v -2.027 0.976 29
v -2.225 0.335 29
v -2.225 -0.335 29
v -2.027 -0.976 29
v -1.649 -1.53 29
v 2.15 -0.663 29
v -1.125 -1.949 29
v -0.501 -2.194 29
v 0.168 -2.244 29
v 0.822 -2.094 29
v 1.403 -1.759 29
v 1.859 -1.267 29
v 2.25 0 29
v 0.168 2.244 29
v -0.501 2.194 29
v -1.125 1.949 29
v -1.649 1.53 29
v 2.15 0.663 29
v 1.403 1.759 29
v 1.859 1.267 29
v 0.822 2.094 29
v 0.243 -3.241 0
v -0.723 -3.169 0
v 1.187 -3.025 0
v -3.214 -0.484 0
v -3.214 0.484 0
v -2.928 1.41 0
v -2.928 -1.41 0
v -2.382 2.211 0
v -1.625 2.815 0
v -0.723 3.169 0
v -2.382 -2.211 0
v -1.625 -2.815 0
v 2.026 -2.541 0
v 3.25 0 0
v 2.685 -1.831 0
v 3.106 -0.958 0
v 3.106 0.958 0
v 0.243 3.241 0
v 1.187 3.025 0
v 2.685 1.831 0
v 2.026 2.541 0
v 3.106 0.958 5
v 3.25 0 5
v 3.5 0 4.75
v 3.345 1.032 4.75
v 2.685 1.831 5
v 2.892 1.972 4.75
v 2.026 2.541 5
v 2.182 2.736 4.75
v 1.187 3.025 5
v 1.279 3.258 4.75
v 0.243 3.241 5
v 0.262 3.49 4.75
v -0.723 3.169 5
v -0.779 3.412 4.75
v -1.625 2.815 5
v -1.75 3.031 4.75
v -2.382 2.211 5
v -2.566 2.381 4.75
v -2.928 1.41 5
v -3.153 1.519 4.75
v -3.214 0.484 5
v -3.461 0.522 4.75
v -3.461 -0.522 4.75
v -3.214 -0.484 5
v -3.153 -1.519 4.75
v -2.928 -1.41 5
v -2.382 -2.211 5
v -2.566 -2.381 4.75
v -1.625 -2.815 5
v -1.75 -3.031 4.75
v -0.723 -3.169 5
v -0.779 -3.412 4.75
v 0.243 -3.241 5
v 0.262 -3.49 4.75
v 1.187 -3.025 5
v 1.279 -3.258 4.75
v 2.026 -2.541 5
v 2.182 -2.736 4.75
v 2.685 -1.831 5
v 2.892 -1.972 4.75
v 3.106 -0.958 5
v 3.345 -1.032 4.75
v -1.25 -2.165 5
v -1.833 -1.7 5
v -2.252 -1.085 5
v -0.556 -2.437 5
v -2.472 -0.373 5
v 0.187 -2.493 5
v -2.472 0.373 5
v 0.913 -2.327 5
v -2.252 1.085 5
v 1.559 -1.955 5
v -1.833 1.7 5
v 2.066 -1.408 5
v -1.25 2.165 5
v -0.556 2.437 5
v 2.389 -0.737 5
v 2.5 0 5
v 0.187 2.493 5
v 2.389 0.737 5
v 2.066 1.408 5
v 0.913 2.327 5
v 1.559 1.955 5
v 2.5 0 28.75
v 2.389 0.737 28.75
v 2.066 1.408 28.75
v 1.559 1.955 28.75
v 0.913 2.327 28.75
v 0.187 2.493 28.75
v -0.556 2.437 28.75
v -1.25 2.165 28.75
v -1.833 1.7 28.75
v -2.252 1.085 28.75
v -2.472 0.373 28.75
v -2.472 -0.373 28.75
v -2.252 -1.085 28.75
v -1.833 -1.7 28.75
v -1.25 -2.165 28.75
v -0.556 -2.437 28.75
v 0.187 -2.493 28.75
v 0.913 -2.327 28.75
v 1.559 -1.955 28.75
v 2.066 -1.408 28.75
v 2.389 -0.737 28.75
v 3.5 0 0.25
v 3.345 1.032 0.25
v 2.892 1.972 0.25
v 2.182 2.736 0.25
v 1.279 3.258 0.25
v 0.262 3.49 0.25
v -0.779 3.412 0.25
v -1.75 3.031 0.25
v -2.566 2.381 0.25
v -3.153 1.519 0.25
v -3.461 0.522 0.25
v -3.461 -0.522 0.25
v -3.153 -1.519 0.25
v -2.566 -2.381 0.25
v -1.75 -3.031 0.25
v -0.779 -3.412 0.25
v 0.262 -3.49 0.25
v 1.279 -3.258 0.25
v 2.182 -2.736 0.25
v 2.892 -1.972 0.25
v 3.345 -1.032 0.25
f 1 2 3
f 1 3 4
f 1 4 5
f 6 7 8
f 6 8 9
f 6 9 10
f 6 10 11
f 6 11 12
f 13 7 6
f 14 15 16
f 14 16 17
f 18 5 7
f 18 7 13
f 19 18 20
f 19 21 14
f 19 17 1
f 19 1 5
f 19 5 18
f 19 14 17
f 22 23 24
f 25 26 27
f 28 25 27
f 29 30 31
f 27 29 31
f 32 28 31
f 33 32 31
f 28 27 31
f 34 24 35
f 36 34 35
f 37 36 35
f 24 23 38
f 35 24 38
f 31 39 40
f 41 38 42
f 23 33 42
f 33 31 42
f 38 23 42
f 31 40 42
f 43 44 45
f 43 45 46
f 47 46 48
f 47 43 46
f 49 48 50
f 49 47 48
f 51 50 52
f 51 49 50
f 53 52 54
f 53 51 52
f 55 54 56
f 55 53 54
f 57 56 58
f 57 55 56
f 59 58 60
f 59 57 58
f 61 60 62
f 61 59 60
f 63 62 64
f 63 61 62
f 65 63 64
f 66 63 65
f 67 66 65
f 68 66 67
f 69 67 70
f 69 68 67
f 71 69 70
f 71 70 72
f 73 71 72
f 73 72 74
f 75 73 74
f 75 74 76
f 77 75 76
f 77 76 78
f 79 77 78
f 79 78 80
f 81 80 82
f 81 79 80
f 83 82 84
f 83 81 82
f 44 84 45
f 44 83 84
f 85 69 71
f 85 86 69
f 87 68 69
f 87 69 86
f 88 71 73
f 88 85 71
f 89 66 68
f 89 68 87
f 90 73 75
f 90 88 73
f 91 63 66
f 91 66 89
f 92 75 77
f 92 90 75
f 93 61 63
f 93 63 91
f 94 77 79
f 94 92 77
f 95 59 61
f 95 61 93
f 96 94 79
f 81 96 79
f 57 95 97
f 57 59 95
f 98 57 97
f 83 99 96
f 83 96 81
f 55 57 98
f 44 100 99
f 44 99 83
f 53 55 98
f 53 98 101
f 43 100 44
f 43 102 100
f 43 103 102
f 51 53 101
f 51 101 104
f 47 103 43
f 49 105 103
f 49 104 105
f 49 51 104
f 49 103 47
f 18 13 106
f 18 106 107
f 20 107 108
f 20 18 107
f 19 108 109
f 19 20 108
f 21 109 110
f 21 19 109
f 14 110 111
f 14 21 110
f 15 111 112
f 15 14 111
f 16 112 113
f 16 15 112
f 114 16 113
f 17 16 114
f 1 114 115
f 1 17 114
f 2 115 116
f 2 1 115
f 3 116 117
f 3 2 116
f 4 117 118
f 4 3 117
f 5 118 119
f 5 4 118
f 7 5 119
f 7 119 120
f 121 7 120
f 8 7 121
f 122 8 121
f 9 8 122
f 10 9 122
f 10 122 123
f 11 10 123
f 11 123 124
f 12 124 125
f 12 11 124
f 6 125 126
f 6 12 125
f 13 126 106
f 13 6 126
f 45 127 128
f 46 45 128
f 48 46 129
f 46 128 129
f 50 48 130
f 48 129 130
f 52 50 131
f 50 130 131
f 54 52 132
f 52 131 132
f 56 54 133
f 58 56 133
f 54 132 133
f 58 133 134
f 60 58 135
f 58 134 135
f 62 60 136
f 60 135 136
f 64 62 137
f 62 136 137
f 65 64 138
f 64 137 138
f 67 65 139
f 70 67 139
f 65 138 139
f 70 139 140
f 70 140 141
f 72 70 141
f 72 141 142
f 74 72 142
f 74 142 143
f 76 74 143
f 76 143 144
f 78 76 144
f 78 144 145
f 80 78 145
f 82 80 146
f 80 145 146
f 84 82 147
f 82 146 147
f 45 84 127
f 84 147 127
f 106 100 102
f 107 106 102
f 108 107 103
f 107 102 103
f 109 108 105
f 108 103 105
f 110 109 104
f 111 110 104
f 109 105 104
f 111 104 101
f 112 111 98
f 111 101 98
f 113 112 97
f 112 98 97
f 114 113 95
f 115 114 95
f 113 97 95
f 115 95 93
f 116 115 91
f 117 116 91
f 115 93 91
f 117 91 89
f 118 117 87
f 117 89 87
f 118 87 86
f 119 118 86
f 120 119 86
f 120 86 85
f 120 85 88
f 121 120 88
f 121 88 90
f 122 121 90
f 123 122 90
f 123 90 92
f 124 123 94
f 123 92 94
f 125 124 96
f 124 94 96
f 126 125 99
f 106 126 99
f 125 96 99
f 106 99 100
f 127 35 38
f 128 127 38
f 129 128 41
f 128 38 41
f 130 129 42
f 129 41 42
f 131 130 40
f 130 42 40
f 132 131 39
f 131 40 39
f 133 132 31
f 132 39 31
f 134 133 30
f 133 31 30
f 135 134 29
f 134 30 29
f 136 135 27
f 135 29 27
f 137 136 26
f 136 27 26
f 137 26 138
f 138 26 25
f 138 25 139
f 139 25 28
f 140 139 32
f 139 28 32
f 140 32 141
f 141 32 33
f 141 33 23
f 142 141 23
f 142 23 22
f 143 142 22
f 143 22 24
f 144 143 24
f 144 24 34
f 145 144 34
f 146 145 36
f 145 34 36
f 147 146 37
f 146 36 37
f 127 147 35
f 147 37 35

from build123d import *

# Parameters (mm, degrees)
SCHIZZO1_R                   = 3.5
ESTRUSIONE_ESTRUSIONE1_DEPTH = 5
SCHIZZO2_R                   = 2.5
ESTRUSIONE_ESTRUSIONE2_DEPTH = 24
SMUSSO1_SIZE                 = 0.25


with BuildPart() as part:
    # Schizzo1 → Estrusione-Estrusione1 (new body)
    with BuildSketch(Plane.XY):
        Circle(SCHIZZO1_R)
    extrude(amount=ESTRUSIONE_ESTRUSIONE1_DEPTH)

    # Schizzo2 → Estrusione-Estrusione2 (add)
    with BuildSketch(Plane.XY.offset(5)):
        Circle(SCHIZZO2_R)
    extrude(amount=ESTRUSIONE_ESTRUSIONE2_DEPTH)

    # Smusso1
    smusso1_edges = [part.edges().sort_by_distance(p)[0] for p in [
        (-3.5, 0, 0),
        (-3.5, 0, 5),
        (-2.5, 0, 29),
    ]]
    chamfer(smusso1_edges, length=SMUSSO1_SIZE)


solid = part.part
